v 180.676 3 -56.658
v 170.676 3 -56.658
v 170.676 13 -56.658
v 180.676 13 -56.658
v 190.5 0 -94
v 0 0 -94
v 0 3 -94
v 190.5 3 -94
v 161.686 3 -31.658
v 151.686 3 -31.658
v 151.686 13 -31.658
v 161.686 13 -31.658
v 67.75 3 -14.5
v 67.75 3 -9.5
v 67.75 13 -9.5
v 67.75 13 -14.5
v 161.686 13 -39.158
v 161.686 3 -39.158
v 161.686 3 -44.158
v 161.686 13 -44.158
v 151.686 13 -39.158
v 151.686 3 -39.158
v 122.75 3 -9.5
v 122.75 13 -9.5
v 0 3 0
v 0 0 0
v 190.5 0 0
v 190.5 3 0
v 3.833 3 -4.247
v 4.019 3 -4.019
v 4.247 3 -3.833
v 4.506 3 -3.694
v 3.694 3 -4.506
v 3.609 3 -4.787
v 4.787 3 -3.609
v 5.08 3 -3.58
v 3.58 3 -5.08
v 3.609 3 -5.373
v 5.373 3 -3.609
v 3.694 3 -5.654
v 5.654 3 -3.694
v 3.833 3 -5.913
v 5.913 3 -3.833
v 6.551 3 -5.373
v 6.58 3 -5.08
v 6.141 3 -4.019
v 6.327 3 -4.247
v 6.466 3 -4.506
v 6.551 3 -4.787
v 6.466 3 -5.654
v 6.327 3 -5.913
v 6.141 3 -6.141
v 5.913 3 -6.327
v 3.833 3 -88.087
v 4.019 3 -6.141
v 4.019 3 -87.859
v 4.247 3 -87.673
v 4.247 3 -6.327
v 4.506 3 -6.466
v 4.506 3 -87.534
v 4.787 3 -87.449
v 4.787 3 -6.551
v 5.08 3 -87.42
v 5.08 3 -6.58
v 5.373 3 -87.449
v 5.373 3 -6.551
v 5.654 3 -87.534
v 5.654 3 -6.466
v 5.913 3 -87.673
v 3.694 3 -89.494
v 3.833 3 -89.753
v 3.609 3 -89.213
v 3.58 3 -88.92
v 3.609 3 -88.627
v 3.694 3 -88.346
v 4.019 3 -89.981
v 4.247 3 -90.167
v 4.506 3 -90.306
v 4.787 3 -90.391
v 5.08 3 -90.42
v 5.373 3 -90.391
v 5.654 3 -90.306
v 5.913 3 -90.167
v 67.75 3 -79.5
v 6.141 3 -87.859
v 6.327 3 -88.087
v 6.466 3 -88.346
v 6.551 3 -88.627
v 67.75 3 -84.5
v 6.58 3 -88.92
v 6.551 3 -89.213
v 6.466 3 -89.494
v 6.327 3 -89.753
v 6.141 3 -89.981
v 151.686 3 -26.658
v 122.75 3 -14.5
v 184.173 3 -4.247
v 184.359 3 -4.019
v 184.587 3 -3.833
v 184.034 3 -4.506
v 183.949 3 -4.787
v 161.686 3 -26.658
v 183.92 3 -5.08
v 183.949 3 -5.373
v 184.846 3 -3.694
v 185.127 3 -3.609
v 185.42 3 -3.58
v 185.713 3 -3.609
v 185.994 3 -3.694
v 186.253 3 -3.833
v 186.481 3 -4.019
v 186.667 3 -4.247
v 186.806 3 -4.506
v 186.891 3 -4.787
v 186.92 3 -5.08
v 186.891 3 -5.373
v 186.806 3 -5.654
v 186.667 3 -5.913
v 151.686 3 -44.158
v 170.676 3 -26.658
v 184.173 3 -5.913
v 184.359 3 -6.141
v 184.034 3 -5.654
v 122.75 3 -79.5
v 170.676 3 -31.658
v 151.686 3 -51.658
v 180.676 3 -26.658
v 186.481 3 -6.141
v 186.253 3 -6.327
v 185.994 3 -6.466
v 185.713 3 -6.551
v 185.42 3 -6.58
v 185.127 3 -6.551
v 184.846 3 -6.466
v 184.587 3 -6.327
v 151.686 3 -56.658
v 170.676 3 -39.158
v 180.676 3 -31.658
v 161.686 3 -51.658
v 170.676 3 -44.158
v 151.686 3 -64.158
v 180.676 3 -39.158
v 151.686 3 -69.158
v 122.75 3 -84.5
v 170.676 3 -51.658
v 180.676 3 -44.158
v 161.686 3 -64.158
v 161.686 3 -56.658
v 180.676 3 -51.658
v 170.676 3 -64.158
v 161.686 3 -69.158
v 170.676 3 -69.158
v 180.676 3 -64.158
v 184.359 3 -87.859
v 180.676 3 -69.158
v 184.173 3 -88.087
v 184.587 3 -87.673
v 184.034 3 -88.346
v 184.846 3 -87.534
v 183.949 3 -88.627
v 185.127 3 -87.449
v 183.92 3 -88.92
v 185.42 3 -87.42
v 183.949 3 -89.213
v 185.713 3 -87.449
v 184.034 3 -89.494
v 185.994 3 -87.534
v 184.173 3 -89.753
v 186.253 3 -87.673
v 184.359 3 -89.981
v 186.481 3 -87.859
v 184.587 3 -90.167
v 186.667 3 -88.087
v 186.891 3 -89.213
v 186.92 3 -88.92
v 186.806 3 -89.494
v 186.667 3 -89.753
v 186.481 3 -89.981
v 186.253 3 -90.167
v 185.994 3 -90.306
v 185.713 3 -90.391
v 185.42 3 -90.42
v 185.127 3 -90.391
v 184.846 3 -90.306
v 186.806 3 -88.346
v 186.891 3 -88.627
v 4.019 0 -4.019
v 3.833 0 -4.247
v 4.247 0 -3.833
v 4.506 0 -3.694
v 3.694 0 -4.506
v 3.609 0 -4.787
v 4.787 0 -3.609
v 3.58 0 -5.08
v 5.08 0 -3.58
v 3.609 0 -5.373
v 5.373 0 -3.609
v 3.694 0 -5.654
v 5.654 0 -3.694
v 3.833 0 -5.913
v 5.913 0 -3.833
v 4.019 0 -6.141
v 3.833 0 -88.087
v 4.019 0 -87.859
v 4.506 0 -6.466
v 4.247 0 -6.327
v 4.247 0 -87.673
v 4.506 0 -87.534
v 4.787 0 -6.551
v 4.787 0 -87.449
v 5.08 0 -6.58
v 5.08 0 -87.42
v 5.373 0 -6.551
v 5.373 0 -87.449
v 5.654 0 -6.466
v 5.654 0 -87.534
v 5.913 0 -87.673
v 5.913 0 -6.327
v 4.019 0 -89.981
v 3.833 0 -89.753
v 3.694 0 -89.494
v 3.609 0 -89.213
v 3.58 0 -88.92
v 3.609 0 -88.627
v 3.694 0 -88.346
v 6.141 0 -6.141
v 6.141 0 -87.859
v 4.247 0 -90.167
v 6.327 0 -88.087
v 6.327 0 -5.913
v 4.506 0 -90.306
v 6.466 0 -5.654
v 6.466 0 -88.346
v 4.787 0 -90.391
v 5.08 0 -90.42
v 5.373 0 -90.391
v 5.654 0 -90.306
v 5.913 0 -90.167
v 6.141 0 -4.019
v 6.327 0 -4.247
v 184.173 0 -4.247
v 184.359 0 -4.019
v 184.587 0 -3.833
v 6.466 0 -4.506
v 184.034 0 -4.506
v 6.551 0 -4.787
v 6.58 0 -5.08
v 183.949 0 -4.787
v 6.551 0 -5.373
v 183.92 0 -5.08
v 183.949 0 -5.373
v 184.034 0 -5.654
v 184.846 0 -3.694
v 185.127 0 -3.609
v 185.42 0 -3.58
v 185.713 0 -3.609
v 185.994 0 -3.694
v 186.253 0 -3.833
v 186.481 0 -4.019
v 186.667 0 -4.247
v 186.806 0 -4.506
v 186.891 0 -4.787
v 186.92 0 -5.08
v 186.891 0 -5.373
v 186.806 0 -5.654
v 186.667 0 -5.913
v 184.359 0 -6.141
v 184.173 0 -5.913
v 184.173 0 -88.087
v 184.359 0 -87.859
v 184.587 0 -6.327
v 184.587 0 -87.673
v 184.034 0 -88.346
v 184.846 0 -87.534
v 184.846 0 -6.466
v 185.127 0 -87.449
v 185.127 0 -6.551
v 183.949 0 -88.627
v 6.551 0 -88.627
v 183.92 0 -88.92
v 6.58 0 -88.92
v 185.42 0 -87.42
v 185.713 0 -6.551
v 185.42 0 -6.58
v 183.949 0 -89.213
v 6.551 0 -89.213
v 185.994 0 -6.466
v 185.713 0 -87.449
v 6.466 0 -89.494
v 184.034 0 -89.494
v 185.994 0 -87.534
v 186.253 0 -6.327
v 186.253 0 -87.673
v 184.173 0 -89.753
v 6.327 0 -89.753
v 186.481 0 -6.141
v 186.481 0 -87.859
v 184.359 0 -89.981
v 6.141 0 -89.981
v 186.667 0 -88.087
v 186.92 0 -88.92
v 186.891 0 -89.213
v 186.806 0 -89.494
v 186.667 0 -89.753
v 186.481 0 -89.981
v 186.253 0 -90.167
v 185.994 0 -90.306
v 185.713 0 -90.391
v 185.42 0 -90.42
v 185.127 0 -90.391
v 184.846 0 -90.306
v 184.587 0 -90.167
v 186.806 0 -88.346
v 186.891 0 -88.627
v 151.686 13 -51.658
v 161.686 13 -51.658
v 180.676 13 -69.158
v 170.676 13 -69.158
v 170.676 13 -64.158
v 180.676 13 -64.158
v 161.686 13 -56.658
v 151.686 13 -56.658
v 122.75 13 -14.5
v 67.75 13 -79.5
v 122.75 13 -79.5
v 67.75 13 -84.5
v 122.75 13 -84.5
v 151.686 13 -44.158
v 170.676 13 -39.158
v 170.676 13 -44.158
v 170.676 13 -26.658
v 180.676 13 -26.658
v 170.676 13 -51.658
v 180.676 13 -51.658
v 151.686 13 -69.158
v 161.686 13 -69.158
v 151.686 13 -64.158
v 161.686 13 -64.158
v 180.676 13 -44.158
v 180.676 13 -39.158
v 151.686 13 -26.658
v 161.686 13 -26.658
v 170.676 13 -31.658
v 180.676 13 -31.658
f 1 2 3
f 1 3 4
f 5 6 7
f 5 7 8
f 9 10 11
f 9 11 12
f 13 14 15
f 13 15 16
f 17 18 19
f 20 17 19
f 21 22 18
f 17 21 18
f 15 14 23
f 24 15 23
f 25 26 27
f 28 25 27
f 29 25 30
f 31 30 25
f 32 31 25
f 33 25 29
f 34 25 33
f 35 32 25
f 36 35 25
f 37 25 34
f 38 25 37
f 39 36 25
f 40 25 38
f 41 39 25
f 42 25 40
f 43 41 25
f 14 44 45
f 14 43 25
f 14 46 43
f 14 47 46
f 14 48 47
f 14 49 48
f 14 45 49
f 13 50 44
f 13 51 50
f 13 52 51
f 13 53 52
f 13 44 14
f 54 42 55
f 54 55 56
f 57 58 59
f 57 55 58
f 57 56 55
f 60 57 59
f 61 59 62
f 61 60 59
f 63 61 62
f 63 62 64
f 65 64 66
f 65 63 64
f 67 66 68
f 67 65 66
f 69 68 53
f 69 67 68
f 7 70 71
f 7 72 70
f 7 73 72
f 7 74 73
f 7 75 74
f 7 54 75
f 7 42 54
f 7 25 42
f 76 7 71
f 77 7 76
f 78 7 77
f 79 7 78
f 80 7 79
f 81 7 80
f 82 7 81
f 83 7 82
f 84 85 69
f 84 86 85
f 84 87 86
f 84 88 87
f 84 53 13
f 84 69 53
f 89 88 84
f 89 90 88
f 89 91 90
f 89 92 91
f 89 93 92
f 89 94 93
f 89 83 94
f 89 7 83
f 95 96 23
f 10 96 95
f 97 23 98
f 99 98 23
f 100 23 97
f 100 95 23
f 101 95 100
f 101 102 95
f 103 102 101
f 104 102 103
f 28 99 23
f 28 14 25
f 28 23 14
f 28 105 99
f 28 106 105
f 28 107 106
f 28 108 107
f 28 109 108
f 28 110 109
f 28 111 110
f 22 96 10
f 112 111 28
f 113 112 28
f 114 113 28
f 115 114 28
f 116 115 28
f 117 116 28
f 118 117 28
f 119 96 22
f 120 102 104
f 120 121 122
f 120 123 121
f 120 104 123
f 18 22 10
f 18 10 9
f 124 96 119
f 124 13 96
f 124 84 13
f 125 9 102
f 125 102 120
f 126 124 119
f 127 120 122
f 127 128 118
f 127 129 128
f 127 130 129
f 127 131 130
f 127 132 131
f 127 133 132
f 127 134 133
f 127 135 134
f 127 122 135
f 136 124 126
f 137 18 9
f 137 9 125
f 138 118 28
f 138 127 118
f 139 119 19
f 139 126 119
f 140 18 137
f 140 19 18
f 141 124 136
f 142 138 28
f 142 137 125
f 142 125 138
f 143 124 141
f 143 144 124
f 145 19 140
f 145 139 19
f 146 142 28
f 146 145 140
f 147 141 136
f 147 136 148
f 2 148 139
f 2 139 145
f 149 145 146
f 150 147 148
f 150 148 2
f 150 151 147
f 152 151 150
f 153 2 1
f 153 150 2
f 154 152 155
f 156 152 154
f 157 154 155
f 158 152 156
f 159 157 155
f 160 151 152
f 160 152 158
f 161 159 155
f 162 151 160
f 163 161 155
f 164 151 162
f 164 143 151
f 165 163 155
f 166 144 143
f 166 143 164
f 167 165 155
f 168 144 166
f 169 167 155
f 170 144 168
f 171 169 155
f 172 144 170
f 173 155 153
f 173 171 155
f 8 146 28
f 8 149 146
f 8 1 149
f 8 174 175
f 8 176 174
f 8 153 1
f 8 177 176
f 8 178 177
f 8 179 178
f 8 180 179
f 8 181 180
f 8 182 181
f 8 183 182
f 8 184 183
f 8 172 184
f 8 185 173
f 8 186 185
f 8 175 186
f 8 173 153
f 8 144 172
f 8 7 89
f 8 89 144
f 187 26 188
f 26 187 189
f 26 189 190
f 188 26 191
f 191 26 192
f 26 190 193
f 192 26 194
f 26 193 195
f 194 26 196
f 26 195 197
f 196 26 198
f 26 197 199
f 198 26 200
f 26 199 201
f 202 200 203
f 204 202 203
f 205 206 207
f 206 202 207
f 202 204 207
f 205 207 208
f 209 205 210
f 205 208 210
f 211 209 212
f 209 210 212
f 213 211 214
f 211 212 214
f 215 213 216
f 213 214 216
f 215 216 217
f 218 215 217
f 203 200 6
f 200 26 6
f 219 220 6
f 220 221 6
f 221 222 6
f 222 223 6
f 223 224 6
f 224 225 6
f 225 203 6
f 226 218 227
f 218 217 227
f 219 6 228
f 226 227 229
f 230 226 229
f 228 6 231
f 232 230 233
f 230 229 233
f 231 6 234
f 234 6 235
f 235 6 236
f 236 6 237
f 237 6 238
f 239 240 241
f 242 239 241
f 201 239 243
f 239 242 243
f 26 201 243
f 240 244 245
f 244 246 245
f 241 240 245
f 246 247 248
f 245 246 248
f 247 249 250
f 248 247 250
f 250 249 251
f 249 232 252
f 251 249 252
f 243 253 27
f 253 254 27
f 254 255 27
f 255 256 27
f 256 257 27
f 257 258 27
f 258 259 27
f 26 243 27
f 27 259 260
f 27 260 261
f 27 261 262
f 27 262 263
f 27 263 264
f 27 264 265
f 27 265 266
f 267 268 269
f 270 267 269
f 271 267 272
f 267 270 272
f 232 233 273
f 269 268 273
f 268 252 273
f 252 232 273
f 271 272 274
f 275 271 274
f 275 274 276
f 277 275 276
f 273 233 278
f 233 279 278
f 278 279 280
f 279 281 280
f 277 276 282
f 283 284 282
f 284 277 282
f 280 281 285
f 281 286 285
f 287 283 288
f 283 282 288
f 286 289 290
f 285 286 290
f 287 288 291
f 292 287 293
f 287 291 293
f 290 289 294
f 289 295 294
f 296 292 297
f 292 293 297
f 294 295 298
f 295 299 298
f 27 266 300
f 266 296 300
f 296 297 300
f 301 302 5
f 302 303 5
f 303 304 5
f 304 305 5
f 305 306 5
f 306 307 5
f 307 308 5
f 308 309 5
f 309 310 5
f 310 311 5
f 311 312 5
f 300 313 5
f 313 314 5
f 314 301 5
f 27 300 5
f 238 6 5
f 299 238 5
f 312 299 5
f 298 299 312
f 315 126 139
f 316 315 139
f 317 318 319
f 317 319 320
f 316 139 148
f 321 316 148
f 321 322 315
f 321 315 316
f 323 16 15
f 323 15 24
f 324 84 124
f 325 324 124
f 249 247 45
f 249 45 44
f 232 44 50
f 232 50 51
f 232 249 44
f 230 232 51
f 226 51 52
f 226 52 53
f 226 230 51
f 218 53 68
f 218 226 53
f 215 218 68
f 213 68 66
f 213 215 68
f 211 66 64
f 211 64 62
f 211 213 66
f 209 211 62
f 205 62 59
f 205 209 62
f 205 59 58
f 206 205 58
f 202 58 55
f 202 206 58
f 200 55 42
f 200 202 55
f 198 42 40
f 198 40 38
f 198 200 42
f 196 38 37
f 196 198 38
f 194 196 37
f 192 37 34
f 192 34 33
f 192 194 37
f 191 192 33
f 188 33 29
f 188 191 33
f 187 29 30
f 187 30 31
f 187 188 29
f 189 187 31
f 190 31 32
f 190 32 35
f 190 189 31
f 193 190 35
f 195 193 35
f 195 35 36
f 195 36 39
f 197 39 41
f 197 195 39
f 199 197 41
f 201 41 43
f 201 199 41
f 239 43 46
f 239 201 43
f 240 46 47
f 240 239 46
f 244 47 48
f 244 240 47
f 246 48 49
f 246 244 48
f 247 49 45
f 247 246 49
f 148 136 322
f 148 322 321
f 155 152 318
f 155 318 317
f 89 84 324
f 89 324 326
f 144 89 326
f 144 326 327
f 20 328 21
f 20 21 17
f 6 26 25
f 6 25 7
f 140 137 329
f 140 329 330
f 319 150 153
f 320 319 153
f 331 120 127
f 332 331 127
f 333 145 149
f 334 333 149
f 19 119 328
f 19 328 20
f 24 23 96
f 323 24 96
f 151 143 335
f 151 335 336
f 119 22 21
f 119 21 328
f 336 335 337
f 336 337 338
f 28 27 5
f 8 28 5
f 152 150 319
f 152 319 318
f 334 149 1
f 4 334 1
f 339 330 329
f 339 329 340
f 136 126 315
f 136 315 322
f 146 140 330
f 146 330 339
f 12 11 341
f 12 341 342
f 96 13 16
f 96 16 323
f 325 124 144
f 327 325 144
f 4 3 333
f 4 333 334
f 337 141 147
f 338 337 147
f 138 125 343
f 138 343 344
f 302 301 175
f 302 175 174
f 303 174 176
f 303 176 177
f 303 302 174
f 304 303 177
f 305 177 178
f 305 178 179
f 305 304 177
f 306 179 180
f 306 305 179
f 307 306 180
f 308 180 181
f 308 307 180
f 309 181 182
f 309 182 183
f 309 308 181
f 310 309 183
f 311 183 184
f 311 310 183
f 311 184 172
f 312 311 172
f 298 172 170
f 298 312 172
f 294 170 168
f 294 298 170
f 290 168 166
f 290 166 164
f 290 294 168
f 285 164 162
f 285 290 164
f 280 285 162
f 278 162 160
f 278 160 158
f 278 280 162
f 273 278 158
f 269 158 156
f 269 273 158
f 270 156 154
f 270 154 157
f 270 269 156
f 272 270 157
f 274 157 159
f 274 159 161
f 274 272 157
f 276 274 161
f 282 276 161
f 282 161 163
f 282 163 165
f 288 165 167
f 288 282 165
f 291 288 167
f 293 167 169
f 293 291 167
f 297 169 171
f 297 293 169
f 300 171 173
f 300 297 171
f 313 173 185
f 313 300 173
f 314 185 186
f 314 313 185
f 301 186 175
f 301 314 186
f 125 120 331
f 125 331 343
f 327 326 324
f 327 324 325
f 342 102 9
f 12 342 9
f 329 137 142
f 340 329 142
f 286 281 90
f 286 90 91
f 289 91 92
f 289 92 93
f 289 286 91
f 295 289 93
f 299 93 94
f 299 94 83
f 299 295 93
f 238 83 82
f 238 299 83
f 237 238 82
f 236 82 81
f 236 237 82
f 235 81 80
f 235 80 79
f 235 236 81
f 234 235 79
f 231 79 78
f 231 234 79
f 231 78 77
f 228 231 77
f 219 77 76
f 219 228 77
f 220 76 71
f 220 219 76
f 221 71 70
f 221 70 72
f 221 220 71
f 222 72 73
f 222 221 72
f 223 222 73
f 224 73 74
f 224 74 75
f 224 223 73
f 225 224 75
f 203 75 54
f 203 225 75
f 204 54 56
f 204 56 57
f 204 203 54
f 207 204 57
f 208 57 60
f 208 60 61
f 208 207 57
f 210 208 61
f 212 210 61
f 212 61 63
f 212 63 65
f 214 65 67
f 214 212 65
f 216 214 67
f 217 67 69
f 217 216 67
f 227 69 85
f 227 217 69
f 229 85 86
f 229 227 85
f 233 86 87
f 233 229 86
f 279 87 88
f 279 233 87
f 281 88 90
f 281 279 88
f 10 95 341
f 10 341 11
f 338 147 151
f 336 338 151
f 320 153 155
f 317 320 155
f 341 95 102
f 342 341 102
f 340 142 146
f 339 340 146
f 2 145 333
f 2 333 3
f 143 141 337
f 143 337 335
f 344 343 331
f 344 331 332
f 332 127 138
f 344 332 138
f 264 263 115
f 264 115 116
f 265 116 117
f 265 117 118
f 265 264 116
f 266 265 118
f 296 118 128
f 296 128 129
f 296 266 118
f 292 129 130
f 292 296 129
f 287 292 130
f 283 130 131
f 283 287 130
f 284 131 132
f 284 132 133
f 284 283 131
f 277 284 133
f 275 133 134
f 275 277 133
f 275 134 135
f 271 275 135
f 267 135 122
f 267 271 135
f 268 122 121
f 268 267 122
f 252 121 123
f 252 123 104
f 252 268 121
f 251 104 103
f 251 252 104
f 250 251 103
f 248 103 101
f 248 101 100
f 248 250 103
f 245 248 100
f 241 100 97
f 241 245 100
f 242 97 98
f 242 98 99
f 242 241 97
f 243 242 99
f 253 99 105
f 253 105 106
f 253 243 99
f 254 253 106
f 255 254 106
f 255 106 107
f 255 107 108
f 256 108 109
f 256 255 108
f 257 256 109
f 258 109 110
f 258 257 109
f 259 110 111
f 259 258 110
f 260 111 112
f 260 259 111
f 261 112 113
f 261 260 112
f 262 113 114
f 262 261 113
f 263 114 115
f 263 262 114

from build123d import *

# Parameters (mm, degrees)
ESQUISSE1_W      = 190.5
ESQUISSE1_H      = 94
ESQUISSE1_R      = 1.5
EXTRUSION1_DEPTH = 3
ESQUISSE2_W      = 55
ESQUISSE2_H      = 5
EXTRUSION2_DEPTH = 10
ESQUISSE4_W      = 10
ESQUISSE4_H      = 5
EXTRUSION4_DEPTH = 10


with BuildPart() as part:
    # Esquisse1 → Extrusion1 (new body)
    with BuildSketch(Plane(origin=(0, 0, 0), x_dir=(1, 0, 0), z_dir=(0, 1, 0))):
        with Locations((95.25, 47)):
            Rectangle(ESQUISSE1_W, ESQUISSE1_H)
        with Locations((5.08, 88.92)):
            Circle(ESQUISSE1_R, mode=Mode.SUBTRACT)
        with Locations((185.42, 88.92)):
            Circle(ESQUISSE1_R, mode=Mode.SUBTRACT)
        with Locations((185.42, 5.08)):
            Circle(ESQUISSE1_R, mode=Mode.SUBTRACT)
        with Locations((5.08, 5.08)):
            Circle(ESQUISSE1_R, mode=Mode.SUBTRACT)
    extrude(amount=EXTRUSION1_DEPTH)

    # Esquisse2 → Extrusion2 (add)
    with BuildSketch(Plane(origin=(0, 3, 0), x_dir=(1, 0, 0), z_dir=(0, 1, 0))):
        with Locations((95.25, 82)):
            Rectangle(ESQUISSE2_W, ESQUISSE2_H)
        with Locations((95.25, 12)):
            Rectangle(ESQUISSE2_W, ESQUISSE2_H)
    extrude(amount=EXTRUSION2_DEPTH)

    # Esquisse4 → Extrusion4 (add)
    with BuildSketch(Plane(origin=(0, 3, 0), x_dir=(1, 0, 0), z_dir=(0, 1, 0))):
        with Locations((175.67625178, 66.658495743)):
            Rectangle(ESQUISSE4_W, ESQUISSE4_H)
        with Locations((156.685730764, 66.658495743)):
            Rectangle(ESQUISSE4_W, ESQUISSE4_H)
        with Locations((156.685730764, 41.658495743)):
            Rectangle(ESQUISSE4_W, ESQUISSE4_H)
        with Locations((156.685730764, 29.158495743)):
            Rectangle(ESQUISSE4_W, ESQUISSE4_H)
        with Locations((156.685730764, 54.158495743)):
            Rectangle(ESQUISSE4_W, ESQUISSE4_H)
        with Locations((175.67625178, 41.658495743)):
            Rectangle(ESQUISSE4_W, ESQUISSE4_H)
        with Locations((175.67625178, 29.158495743)):
            Rectangle(ESQUISSE4_W, ESQUISSE4_H)
        with Locations((175.67625178, 54.158495743)):
            Rectangle(ESQUISSE4_W, ESQUISSE4_H)
    extrude(amount=EXTRUSION4_DEPTH)


solid = part.part
